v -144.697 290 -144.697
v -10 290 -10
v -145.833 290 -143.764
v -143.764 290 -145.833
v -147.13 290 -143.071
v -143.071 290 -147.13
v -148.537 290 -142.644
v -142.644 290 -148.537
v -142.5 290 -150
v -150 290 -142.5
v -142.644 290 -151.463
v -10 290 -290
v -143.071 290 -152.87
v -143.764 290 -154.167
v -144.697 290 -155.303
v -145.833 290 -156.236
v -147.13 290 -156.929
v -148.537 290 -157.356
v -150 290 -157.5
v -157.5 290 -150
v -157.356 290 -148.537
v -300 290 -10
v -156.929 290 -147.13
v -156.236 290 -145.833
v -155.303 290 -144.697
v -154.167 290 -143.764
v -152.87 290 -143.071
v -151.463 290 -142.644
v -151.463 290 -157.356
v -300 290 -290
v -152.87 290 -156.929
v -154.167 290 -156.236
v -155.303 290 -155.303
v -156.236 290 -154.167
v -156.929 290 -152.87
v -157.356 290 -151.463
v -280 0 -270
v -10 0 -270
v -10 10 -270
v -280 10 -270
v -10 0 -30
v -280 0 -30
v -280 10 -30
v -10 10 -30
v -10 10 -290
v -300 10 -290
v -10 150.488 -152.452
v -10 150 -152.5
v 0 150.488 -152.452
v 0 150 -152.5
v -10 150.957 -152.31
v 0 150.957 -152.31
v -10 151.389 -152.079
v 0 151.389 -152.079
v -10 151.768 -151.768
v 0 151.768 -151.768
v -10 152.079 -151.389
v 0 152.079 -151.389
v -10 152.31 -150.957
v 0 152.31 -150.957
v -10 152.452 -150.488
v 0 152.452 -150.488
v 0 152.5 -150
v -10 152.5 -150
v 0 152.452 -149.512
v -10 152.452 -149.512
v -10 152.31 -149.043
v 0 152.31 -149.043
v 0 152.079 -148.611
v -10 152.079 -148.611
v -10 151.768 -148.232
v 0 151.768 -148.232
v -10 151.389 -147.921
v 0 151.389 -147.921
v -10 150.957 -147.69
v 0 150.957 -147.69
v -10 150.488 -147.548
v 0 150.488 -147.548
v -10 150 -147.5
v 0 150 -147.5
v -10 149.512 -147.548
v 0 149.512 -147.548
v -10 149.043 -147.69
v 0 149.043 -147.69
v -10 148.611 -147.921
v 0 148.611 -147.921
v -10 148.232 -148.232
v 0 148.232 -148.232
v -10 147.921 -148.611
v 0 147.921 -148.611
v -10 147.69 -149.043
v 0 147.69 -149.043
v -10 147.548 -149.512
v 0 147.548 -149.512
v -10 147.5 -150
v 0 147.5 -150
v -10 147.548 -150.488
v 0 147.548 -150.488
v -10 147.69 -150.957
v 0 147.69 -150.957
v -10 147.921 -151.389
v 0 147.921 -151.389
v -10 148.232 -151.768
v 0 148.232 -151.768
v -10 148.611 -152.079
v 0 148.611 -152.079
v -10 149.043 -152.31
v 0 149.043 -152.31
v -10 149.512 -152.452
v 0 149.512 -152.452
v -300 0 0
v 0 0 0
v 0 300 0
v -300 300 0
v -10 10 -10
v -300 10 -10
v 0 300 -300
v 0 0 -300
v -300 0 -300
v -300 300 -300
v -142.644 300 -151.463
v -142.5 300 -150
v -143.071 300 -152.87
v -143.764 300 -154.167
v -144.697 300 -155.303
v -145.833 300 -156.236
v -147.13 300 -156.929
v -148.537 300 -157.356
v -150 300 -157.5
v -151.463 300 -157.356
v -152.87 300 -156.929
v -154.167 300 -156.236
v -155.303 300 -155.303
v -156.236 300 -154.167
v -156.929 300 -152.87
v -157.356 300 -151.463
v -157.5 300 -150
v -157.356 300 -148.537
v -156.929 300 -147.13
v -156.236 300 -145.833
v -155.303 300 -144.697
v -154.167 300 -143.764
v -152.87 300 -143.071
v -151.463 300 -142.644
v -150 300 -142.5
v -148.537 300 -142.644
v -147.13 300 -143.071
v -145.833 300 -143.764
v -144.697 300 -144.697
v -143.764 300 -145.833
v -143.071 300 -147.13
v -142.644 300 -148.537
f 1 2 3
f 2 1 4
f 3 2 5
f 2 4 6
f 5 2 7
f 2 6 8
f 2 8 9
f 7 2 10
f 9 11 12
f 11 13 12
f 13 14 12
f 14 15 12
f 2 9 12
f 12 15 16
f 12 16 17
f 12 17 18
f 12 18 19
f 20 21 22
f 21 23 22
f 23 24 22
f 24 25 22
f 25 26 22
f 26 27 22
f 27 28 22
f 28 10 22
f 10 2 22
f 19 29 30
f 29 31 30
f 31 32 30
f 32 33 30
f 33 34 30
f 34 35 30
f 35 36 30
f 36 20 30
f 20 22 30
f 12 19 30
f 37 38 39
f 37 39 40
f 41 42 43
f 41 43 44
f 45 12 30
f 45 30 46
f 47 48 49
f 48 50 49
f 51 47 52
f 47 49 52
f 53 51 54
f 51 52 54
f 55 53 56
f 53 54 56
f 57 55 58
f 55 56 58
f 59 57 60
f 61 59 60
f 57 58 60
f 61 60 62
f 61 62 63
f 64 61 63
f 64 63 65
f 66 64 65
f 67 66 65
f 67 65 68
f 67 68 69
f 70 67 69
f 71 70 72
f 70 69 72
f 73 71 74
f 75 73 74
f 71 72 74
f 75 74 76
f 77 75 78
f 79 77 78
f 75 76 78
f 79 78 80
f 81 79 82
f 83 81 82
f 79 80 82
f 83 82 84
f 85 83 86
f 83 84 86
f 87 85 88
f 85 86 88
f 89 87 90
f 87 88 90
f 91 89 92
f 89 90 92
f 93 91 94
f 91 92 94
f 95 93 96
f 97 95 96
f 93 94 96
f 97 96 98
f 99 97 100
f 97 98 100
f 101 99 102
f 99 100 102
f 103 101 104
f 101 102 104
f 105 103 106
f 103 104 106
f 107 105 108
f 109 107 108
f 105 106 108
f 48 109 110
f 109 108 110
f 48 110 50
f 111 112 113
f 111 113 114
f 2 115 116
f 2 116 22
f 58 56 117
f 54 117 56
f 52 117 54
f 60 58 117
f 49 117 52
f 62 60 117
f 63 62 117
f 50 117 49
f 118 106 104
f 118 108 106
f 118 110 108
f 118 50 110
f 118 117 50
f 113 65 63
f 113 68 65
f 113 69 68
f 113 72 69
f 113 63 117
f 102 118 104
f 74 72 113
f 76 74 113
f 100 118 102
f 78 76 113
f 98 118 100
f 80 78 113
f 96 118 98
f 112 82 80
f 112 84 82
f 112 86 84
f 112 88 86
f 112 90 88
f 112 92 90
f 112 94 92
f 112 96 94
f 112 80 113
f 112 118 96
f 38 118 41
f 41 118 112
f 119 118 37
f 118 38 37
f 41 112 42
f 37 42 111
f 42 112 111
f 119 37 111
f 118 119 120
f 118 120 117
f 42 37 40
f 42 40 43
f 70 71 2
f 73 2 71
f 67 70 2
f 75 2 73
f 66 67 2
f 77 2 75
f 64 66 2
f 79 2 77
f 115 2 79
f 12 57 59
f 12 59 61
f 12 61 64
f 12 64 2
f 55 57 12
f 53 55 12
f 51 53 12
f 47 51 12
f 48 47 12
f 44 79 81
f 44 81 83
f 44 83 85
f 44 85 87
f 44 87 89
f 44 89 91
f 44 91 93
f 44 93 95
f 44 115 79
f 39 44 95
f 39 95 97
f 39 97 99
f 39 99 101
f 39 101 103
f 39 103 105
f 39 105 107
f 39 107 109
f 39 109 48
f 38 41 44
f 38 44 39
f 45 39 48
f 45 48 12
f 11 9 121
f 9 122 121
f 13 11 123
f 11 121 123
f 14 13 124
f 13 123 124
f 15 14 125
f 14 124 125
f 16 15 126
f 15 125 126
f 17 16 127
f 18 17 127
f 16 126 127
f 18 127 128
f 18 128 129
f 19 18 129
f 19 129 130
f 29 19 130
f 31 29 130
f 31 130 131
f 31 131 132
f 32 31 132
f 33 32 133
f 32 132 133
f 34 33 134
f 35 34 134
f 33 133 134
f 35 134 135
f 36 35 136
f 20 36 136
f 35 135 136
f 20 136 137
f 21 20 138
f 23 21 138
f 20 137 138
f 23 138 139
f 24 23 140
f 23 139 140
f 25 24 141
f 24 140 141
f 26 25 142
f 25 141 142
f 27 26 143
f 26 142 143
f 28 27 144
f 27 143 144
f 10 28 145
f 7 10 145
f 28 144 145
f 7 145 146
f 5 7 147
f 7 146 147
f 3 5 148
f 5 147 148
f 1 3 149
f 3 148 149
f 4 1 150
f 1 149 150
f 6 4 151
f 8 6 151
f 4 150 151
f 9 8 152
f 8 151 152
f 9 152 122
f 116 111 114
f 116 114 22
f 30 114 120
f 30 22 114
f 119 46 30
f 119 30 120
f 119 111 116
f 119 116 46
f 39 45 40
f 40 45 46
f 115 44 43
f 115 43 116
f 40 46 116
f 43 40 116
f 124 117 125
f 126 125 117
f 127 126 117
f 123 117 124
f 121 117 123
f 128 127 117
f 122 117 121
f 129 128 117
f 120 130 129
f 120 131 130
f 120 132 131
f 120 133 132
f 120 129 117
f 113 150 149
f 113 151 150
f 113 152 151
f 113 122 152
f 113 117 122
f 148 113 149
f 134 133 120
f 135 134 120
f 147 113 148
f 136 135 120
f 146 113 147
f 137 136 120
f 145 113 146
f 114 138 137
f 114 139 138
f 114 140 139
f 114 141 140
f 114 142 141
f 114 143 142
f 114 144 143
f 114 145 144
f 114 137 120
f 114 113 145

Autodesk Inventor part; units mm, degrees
ref_plane "YZ Plane" through (0, 0, 0) normal (1, 0, 0) x (0, 1, 0)
ref_plane "XZ Plane" through (0, 0, 0) normal (0, 1, 0) x (-1, 0, 0)
ref_plane "XY Plane" through (0, 0, 0) normal (0, 0, 1) x (1, 0, 0)
sketch "Sketch1" plane through (0, 0, 0) normal (0, 1, 0) x (-1, 0, 0)
  line L0 (0, 0) -> (300, 0)
  line L1 (300, 0) -> (300, -300)
  line L2 (300, -300) -> (0, -300)
  line L3 (0, -300) -> (0, 0)
  dimension "d0" = 300
  dimension "d1" = 300
extrude "Extrusion1" add sketch "Sketch1" along normal blind 300
sketch "Sketch3" plane through (0, 0, 0) normal (0, -1, 0) x (1, 0, 0)
  line L0 (-10, -270) -> (-280, -270)
  line L1 (-280, -270) -> (-280, -30)
  line L2 (-280, -30) -> (-10, -30)
  line L3 (-10, -30) -> (-10, -270)
  line L4 (0, 0) -> (0, -300) projected
  line L5 (-300, -300) -> (-300, 0) projected
  line L6 (0, -300) -> (-300, -300) projected
  line L7 (-300, 0) -> (0, 0) projected
  dimension "d10" = 10
  dimension "d11" = 20
  dimension "d12" = 30
  dimension "d13" = 30
extrude "Extrusion3" cut sketch "Sketch3" against normal blind 10 contours L0 L1 L2 L3
sketch "Sketch5" plane through (-300, 0, -300) normal (-1, 0, 0) x (0, 0, 1)
  line L0 (10, 10) -> (290, 10)
  line L1 (290, 10) -> (290, 290)
  line L2 (290, 290) -> (10, 290)
  line L3 (10, 290) -> (10, 10)
  line L4 (0, 300) -> (300, 300) projected
  line L5 (0, 0) -> (300, 0) projected
  line L6 (0, 0) -> (0, 300) projected
  line L7 (300, 0) -> (300, 300) projected
  dimension "d22" = 10
  dimension "d23" = 10
  dimension "d24" = 10
  dimension "d25" = 10
extrude "Extrusion5" cut sketch "Sketch5" against normal blind 290 contours L3 L2 L1 L0
sketch "Sketch7" plane through (0, 0, 0) normal (1, 0, 0) x (0, 0, -1)
  circle A0 centre (150, 150) radius 2.5
  line L0 (0, 300) -> (300, 300) projected
  line L1 (300, 0) -> (300, 300) projected
  point P0 (0, 0)
  dimension "d37" = 5
  dimension "d38" = 150
  dimension "d39" = 150
extrude "Extrusion7" cut sketch "Sketch7" against normal blind 10
sketch "Sketch8" plane through (0, 300, 0) normal (0, 1, 0) x (1, 0, 0)
  circle A0 centre (-150, 150) radius 7.5
  line L0 (0, 0) -> (0, 300) projected
  line L1 (0, 300) -> (-300, 300) projected
  dimension "d42" = 15
  dimension "d43" = 150
  dimension "d44" = 150
extrude "Extrusion8" cut sketch "Sketch8" against normal through all
properties part number "temporary" material "PC/ABS Plastic"
